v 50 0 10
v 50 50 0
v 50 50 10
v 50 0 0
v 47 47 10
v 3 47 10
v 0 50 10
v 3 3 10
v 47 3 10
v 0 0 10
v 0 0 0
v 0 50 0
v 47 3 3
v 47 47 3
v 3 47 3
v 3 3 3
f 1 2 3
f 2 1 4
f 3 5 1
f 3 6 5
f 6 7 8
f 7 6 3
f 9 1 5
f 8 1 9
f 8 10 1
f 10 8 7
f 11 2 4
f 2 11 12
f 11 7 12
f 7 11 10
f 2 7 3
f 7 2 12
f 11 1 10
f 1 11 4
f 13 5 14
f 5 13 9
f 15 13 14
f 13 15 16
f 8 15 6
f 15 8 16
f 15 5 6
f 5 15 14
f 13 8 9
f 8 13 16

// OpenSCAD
// Generated by HEIDI for job job_1787718599814_fa58becc
// Product: 3D-Printable Model Preparation Package
// Request: E2E production path qualification test — automated cleanup expected
// Model type: box
// Generated: 2026-09-07T04:35:14.590Z
//
// This is a parameterized OpenSCAD model. You can adjust the
// parameters below to customize the dimensions before rendering.

// ─── Parameters ───
width = 50;       // X dimension in mm
height = 50;     // Y dimension in mm
depth = 10;       // Z dimension in mm
wall = 3;    // wall thickness in mm
$fn = 60;               // facet resolution

// Parametric hollow box
module parametric_box() {
    difference() {
        // Outer shell
        cube([width, height, depth]);
        // Inner cavity
        translate([wall, wall, wall])
            cube([width - wall * 2, height - wall * 2, depth - wall + 1]);
    }
}
parametric_box();
